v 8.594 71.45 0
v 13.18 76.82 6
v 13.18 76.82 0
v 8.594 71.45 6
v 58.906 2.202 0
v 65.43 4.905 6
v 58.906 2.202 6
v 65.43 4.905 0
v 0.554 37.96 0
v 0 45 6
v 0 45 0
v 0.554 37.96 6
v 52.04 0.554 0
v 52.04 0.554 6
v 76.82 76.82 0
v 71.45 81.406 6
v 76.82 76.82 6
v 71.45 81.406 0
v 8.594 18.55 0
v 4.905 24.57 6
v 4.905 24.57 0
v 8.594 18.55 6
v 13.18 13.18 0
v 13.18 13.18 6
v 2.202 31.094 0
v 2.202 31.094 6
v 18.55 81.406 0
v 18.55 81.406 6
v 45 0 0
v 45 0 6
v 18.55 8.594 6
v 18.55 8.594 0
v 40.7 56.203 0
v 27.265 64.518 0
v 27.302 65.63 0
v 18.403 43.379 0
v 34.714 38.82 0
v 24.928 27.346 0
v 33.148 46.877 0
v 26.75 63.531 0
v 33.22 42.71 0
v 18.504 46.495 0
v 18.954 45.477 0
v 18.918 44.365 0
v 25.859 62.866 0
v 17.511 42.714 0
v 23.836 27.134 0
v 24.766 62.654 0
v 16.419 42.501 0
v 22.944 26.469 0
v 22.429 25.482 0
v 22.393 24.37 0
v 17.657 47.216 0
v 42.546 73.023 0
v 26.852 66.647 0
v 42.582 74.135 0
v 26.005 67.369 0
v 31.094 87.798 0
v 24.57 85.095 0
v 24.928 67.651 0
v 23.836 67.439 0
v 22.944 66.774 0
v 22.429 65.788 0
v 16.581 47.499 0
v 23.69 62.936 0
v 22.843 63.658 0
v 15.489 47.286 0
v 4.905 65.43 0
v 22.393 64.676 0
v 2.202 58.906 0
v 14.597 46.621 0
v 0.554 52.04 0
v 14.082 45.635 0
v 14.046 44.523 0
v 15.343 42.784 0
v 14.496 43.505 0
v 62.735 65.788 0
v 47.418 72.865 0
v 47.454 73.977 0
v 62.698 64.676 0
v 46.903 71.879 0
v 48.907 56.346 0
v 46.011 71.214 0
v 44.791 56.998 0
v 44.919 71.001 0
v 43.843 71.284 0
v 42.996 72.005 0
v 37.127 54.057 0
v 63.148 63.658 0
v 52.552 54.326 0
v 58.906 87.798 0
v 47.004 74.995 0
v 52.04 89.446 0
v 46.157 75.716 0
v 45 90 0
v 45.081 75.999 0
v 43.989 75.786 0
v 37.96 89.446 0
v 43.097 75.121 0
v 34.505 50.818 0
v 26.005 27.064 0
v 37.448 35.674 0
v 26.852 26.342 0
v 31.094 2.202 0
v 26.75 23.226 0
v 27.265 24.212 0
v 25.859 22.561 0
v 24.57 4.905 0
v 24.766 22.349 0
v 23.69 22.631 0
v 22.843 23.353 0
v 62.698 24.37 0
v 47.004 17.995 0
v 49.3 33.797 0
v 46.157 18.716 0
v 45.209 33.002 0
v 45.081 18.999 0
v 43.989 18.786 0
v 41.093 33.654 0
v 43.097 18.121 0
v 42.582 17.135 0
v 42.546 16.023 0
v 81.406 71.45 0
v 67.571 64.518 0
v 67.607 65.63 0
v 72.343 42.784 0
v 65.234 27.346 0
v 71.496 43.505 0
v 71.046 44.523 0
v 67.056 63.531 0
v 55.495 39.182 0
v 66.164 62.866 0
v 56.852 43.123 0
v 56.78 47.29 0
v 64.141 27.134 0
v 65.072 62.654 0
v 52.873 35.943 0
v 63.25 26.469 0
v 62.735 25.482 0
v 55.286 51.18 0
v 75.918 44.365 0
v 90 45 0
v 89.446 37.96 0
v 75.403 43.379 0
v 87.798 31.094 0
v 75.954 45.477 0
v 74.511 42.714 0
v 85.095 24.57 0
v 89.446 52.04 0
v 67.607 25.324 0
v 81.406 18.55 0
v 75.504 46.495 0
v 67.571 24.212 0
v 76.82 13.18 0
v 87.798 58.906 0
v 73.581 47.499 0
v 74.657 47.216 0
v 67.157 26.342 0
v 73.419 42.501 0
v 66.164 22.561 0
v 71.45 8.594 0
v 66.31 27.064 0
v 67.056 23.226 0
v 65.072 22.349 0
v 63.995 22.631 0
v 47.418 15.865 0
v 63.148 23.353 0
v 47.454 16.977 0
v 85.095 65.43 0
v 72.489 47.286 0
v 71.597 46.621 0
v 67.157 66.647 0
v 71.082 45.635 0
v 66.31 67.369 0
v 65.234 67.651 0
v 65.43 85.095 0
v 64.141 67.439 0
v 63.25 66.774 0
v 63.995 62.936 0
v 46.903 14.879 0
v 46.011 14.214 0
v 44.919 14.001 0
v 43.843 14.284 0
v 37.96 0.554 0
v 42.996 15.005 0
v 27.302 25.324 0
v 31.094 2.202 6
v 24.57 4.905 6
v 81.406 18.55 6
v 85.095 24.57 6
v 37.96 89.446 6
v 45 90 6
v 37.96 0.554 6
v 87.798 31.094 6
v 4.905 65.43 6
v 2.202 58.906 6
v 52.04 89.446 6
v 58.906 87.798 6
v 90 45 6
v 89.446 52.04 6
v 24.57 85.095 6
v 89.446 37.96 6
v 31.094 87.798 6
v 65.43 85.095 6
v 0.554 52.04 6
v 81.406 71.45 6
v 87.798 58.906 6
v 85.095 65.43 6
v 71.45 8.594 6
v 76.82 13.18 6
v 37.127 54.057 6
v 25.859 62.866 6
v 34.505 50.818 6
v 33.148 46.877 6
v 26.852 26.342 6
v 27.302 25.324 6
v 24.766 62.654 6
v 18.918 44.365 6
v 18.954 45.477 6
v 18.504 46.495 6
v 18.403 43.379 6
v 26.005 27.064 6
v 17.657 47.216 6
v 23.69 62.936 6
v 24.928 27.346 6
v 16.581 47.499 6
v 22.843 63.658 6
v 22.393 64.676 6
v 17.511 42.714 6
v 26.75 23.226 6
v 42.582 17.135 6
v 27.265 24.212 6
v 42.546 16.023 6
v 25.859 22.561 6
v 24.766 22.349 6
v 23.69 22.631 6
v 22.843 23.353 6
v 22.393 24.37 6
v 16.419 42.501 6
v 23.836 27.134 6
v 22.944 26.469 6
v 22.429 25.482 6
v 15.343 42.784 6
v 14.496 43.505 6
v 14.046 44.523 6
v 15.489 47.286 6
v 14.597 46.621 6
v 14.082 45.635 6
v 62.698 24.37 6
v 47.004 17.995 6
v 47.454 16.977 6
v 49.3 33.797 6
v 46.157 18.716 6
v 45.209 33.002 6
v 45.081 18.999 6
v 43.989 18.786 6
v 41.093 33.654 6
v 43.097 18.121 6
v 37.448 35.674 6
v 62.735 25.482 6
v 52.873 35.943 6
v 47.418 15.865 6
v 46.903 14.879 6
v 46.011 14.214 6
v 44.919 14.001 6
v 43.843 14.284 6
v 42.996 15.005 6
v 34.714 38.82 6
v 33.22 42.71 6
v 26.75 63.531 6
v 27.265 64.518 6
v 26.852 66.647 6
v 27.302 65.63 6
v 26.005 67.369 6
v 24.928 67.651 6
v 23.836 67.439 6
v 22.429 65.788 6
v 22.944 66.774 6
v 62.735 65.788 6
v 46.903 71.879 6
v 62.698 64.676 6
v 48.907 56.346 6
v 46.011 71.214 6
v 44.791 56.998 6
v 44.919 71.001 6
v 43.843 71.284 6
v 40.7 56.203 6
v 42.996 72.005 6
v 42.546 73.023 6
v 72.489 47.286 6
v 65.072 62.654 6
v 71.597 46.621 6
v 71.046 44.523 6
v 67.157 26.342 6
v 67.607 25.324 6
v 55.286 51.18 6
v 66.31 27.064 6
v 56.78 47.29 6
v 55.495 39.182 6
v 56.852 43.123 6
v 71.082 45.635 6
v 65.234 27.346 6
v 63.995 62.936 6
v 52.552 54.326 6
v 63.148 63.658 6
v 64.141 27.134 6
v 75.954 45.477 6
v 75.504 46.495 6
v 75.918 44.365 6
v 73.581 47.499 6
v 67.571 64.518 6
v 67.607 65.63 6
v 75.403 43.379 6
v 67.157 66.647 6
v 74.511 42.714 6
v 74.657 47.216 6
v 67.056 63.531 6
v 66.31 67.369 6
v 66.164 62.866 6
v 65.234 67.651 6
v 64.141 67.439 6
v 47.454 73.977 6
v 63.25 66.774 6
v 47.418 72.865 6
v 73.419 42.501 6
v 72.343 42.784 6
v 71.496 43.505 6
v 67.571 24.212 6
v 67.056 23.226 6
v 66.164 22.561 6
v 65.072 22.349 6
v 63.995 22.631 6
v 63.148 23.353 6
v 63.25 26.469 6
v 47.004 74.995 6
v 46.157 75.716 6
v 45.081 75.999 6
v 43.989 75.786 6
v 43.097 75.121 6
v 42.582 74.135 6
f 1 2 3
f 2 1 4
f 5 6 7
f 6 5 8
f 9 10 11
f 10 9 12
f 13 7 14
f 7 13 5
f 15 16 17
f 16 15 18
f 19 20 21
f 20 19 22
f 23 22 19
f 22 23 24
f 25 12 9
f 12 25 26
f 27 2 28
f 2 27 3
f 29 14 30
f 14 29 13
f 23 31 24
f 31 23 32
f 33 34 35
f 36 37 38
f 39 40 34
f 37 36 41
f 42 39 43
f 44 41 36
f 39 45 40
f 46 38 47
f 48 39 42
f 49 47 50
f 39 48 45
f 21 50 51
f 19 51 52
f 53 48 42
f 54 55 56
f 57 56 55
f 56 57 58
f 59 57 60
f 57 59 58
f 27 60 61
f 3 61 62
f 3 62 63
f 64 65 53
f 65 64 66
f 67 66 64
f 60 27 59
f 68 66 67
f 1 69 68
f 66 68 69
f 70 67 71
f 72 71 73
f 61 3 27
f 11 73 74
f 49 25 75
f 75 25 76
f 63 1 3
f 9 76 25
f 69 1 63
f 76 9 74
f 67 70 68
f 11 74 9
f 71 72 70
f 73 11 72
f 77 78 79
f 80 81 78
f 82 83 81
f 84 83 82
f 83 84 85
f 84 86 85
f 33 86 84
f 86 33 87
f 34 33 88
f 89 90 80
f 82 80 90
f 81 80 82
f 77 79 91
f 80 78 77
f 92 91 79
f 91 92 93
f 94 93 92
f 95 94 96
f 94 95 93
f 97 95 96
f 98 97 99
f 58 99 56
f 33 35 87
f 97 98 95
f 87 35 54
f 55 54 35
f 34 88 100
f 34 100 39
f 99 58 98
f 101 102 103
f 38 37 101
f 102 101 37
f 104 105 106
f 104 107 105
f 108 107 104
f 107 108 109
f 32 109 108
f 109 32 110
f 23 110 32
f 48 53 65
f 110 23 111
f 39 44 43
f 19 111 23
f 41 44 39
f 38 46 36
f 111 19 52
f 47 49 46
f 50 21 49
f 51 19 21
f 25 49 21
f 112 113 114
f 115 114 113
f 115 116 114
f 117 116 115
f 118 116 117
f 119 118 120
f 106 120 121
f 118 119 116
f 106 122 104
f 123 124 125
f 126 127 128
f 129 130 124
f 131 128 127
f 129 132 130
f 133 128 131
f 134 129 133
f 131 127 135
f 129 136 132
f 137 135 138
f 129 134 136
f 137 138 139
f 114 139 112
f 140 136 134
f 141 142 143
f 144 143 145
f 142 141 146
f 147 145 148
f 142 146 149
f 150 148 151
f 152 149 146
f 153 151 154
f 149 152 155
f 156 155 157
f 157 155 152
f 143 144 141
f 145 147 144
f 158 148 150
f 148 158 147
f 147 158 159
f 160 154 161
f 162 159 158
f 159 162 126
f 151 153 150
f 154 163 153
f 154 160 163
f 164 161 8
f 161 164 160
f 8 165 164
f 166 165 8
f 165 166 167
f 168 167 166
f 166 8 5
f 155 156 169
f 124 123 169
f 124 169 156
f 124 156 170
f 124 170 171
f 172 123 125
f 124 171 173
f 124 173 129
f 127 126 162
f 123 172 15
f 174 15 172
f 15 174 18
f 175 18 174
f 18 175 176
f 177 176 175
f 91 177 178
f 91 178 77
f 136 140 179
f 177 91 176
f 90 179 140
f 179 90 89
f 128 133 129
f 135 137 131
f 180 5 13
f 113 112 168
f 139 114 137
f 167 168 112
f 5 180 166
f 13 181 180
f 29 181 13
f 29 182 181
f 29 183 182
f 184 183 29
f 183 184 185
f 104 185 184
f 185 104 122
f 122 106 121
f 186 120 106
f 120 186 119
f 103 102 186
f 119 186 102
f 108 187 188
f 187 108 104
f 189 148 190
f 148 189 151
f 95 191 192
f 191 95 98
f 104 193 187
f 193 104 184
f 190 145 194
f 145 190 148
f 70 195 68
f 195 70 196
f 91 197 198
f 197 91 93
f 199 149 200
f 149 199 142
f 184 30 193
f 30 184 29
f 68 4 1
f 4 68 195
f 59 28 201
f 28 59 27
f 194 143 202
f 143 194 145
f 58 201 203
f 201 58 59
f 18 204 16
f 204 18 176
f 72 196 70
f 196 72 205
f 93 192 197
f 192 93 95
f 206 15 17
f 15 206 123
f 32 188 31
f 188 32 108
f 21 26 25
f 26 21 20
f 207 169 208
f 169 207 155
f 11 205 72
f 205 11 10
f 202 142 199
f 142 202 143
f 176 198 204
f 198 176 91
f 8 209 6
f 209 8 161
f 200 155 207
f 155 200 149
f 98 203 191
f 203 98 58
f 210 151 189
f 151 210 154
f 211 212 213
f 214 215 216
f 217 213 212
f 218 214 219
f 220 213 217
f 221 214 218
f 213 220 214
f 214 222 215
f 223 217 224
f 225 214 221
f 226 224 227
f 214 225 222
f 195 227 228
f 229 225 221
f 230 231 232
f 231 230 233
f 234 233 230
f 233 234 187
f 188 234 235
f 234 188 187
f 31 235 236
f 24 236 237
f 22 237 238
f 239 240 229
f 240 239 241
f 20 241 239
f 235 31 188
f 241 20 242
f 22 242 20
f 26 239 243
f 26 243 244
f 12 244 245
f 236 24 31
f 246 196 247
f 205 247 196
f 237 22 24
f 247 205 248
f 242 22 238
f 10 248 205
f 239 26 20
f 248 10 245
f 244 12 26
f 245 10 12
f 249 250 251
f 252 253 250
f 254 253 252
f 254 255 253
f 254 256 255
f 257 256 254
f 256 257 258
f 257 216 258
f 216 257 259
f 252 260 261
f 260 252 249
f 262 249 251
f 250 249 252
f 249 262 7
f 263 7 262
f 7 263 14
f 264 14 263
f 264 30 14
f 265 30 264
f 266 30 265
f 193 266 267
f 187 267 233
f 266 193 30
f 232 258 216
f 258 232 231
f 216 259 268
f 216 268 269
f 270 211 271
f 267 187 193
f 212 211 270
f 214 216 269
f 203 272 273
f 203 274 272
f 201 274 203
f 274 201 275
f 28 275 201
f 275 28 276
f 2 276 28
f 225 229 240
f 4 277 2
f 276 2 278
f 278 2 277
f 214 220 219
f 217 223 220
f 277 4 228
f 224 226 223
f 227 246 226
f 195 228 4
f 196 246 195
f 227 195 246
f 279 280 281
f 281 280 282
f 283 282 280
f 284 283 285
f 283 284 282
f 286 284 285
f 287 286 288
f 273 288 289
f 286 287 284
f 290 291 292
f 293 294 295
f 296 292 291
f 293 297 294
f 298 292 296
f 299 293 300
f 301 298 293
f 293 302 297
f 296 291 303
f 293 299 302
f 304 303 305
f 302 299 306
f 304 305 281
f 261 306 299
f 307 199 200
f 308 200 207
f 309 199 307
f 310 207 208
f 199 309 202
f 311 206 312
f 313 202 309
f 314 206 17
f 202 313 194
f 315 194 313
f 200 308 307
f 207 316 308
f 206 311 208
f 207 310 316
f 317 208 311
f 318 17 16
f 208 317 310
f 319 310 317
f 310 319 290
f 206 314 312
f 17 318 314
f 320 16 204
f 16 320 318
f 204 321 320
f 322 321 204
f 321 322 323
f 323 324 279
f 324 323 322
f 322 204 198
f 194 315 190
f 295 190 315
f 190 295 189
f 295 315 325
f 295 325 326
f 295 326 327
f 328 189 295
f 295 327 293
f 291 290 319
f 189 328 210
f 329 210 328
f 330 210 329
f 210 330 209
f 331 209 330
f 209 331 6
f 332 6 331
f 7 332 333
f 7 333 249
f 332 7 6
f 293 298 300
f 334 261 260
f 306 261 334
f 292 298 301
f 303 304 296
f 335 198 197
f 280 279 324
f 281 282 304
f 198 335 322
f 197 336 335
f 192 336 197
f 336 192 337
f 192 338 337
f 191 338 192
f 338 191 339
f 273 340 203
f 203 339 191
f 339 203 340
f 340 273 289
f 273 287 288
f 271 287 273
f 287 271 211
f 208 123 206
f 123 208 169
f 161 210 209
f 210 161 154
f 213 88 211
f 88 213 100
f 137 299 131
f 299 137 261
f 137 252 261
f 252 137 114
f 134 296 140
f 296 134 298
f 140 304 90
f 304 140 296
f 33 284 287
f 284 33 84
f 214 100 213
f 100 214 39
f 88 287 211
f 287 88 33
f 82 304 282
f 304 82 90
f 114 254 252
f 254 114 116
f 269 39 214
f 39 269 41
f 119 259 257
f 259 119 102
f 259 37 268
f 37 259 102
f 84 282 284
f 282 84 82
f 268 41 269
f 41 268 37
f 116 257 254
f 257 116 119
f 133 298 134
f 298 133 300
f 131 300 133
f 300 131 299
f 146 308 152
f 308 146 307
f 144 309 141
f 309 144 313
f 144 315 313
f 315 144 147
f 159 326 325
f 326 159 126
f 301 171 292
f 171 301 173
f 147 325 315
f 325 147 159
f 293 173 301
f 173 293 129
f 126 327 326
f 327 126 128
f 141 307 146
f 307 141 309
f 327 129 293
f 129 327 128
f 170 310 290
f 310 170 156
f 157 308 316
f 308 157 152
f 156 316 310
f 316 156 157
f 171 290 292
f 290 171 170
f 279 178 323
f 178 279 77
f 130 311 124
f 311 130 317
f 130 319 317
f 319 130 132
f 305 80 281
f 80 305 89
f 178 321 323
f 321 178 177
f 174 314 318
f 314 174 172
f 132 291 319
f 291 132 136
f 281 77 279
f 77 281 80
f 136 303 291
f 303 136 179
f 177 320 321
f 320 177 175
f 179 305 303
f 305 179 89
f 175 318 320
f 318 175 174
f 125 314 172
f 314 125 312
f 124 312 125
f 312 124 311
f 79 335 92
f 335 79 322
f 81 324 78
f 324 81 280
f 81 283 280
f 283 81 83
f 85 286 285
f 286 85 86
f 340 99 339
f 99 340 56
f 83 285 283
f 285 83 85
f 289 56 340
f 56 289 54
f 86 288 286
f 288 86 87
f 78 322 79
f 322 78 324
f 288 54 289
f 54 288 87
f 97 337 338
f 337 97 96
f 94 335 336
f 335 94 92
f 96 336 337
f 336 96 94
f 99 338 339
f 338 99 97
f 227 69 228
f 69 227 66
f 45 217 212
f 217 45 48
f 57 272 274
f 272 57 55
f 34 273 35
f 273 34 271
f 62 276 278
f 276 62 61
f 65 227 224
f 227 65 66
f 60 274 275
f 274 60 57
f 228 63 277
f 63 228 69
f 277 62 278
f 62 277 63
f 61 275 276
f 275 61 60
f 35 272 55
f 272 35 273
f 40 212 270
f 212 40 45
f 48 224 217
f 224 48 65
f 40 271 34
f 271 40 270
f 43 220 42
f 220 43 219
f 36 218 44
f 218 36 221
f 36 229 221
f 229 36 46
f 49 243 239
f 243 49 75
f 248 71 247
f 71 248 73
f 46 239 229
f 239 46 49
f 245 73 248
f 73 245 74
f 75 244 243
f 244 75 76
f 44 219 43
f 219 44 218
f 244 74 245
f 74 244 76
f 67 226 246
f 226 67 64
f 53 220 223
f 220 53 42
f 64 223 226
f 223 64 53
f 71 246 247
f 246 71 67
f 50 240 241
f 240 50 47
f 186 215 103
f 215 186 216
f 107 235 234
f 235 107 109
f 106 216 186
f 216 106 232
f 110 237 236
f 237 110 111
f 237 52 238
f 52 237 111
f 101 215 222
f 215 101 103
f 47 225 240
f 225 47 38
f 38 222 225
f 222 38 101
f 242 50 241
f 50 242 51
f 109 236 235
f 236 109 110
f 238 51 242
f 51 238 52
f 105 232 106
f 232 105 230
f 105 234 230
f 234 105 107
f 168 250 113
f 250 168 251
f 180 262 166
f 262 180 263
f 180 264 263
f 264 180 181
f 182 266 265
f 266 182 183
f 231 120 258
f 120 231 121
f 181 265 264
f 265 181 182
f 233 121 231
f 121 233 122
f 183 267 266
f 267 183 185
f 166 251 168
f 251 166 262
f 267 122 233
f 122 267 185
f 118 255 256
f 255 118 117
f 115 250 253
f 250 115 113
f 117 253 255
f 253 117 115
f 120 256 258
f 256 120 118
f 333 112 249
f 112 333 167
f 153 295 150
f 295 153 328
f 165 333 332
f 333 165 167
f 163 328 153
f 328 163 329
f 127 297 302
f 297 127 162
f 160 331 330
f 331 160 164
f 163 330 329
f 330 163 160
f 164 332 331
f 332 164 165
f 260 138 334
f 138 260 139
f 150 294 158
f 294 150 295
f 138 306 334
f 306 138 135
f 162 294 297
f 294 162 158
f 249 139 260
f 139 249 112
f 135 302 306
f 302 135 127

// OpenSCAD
$fn = 32;

// ----------------------------------------------------------------------
// Spacer plate: round flange R45, 8 bolts
// ----------------------------------------------------------------------

// --- parameters (mm) ---
bore_r = 12;              // centre bore radius
bolt_r = 2.5;             // bolt hole radius
plate_t = 6;              // plate thickness, Z (extrusion height)
flange_r = 45;            // flange radius
n_bolt = 8;               // bolt hole count
ring_r = 28.5;            // bolt circle radius

profile = [[90, 45], [89.446, 52.04], [87.798, 58.906], [85.095, 65.43], [81.406, 71.45], [76.82, 76.82], [71.45, 81.406], [65.43, 85.095], [58.906, 87.798], [52.04, 89.446], [45, 90], [37.96, 89.446], [31.094, 87.798], [24.57, 85.095], [18.55, 81.406], [13.18, 76.82], [8.594, 71.45], [4.905, 65.43], [2.202, 58.906], [0.554, 52.04], [0, 45], [0.554, 37.96], [2.202, 31.094], [4.905, 24.57], [8.594, 18.55], [13.18, 13.18], [18.55, 8.594], [24.57, 4.905], [31.094, 2.202], [37.96, 0.554], [45, 0], [52.04, 0.554], [58.906, 2.202], [65.43, 4.905], [71.45, 8.594], [76.82, 13.18], [81.406, 18.55], [85.095, 24.57], [87.798, 31.094], [89.446, 37.96]];  // primary outline, 40 points, counter clockwise
void_1 = [[56.78, 47.29], [55.286, 51.18], [52.552, 54.326], [48.907, 56.346], [44.791, 56.998], [40.7, 56.203], [37.127, 54.057], [34.505, 50.818], [33.148, 46.877], [33.22, 42.71], [34.714, 38.82], [37.448, 35.674], [41.093, 33.654], [45.209, 33.002], [49.3, 33.797], [52.873, 35.943], [55.495, 39.182], [56.852, 43.123]];  // centre bore, 18 points
void_2 = [[75.954, 45.477], [75.504, 46.495], [74.657, 47.216], [73.581, 47.499], [72.489, 47.286], [71.597, 46.621], [71.082, 45.635], [71.046, 44.523], [71.496, 43.505], [72.343, 42.784], [73.419, 42.501], [74.511, 42.714], [75.403, 43.379], [75.918, 44.365]];  // bolt hole 1, 14 points
void_3 = [[67.607, 65.63], [67.157, 66.647], [66.31, 67.369], [65.234, 67.651], [64.141, 67.439], [63.25, 66.774], [62.735, 65.788], [62.698, 64.676], [63.148, 63.658], [63.995, 62.936], [65.072, 62.654], [66.164, 62.866], [67.056, 63.531], [67.571, 64.518]];  // bolt hole 2, 14 points
void_4 = [[47.454, 73.977], [47.004, 74.995], [46.157, 75.716], [45.081, 75.999], [43.989, 75.786], [43.097, 75.121], [42.582, 74.135], [42.546, 73.023], [42.996, 72.005], [43.843, 71.284], [44.919, 71.001], [46.011, 71.214], [46.903, 71.879], [47.418, 72.865]];  // bolt hole 3, 14 points
void_5 = [[27.302, 65.63], [26.852, 66.647], [26.005, 67.369], [24.928, 67.651], [23.836, 67.439], [22.944, 66.774], [22.429, 65.788], [22.393, 64.676], [22.843, 63.658], [23.69, 62.936], [24.766, 62.654], [25.859, 62.866], [26.75, 63.531], [27.265, 64.518]];  // bolt hole 4, 14 points
void_6 = [[18.954, 45.477], [18.504, 46.495], [17.657, 47.216], [16.581, 47.499], [15.489, 47.286], [14.597, 46.621], [14.082, 45.635], [14.046, 44.523], [14.496, 43.505], [15.343, 42.784], [16.419, 42.501], [17.511, 42.714], [18.403, 43.379], [18.918, 44.365]];  // bolt hole 5, 14 points
void_7 = [[27.302, 25.324], [26.852, 26.342], [26.005, 27.064], [24.928, 27.346], [23.836, 27.134], [22.944, 26.469], [22.429, 25.482], [22.393, 24.37], [22.843, 23.353], [23.69, 22.631], [24.766, 22.349], [25.859, 22.561], [26.75, 23.226], [27.265, 24.212]];  // bolt hole 6, 14 points
void_8 = [[47.454, 16.977], [47.004, 17.995], [46.157, 18.716], [45.081, 18.999], [43.989, 18.786], [43.097, 18.121], [42.582, 17.135], [42.546, 16.023], [42.996, 15.005], [43.843, 14.284], [44.919, 14.001], [46.011, 14.214], [46.903, 14.879], [47.418, 15.865]];  // bolt hole 7, 14 points
void_9 = [[67.607, 25.324], [67.157, 26.342], [66.31, 27.064], [65.234, 27.346], [64.141, 27.134], [63.25, 26.469], [62.735, 25.482], [62.698, 24.37], [63.148, 23.353], [63.995, 22.631], [65.072, 22.349], [66.164, 22.561], [67.056, 23.226], [67.571, 24.212]];  // bolt hole 8, 14 points

// --- the one profile operation ---
difference() {
  linear_extrude(height = plate_t) polygon(points = profile);
  translate([0, 0, -1])
    linear_extrude(height = plate_t + 2) polygon(points = void_1);
  translate([0, 0, -1])
    linear_extrude(height = plate_t + 2) polygon(points = void_2);
  translate([0, 0, -1])
    linear_extrude(height = plate_t + 2) polygon(points = void_3);
  translate([0, 0, -1])
    linear_extrude(height = plate_t + 2) polygon(points = void_4);
  translate([0, 0, -1])
    linear_extrude(height = plate_t + 2) polygon(points = void_5);
  translate([0, 0, -1])
    linear_extrude(height = plate_t + 2) polygon(points = void_6);
  translate([0, 0, -1])
    linear_extrude(height = plate_t + 2) polygon(points = void_7);
  translate([0, 0, -1])
    linear_extrude(height = plate_t + 2) polygon(points = void_8);
  translate([0, 0, -1])
    linear_extrude(height = plate_t + 2) polygon(points = void_9);
}
